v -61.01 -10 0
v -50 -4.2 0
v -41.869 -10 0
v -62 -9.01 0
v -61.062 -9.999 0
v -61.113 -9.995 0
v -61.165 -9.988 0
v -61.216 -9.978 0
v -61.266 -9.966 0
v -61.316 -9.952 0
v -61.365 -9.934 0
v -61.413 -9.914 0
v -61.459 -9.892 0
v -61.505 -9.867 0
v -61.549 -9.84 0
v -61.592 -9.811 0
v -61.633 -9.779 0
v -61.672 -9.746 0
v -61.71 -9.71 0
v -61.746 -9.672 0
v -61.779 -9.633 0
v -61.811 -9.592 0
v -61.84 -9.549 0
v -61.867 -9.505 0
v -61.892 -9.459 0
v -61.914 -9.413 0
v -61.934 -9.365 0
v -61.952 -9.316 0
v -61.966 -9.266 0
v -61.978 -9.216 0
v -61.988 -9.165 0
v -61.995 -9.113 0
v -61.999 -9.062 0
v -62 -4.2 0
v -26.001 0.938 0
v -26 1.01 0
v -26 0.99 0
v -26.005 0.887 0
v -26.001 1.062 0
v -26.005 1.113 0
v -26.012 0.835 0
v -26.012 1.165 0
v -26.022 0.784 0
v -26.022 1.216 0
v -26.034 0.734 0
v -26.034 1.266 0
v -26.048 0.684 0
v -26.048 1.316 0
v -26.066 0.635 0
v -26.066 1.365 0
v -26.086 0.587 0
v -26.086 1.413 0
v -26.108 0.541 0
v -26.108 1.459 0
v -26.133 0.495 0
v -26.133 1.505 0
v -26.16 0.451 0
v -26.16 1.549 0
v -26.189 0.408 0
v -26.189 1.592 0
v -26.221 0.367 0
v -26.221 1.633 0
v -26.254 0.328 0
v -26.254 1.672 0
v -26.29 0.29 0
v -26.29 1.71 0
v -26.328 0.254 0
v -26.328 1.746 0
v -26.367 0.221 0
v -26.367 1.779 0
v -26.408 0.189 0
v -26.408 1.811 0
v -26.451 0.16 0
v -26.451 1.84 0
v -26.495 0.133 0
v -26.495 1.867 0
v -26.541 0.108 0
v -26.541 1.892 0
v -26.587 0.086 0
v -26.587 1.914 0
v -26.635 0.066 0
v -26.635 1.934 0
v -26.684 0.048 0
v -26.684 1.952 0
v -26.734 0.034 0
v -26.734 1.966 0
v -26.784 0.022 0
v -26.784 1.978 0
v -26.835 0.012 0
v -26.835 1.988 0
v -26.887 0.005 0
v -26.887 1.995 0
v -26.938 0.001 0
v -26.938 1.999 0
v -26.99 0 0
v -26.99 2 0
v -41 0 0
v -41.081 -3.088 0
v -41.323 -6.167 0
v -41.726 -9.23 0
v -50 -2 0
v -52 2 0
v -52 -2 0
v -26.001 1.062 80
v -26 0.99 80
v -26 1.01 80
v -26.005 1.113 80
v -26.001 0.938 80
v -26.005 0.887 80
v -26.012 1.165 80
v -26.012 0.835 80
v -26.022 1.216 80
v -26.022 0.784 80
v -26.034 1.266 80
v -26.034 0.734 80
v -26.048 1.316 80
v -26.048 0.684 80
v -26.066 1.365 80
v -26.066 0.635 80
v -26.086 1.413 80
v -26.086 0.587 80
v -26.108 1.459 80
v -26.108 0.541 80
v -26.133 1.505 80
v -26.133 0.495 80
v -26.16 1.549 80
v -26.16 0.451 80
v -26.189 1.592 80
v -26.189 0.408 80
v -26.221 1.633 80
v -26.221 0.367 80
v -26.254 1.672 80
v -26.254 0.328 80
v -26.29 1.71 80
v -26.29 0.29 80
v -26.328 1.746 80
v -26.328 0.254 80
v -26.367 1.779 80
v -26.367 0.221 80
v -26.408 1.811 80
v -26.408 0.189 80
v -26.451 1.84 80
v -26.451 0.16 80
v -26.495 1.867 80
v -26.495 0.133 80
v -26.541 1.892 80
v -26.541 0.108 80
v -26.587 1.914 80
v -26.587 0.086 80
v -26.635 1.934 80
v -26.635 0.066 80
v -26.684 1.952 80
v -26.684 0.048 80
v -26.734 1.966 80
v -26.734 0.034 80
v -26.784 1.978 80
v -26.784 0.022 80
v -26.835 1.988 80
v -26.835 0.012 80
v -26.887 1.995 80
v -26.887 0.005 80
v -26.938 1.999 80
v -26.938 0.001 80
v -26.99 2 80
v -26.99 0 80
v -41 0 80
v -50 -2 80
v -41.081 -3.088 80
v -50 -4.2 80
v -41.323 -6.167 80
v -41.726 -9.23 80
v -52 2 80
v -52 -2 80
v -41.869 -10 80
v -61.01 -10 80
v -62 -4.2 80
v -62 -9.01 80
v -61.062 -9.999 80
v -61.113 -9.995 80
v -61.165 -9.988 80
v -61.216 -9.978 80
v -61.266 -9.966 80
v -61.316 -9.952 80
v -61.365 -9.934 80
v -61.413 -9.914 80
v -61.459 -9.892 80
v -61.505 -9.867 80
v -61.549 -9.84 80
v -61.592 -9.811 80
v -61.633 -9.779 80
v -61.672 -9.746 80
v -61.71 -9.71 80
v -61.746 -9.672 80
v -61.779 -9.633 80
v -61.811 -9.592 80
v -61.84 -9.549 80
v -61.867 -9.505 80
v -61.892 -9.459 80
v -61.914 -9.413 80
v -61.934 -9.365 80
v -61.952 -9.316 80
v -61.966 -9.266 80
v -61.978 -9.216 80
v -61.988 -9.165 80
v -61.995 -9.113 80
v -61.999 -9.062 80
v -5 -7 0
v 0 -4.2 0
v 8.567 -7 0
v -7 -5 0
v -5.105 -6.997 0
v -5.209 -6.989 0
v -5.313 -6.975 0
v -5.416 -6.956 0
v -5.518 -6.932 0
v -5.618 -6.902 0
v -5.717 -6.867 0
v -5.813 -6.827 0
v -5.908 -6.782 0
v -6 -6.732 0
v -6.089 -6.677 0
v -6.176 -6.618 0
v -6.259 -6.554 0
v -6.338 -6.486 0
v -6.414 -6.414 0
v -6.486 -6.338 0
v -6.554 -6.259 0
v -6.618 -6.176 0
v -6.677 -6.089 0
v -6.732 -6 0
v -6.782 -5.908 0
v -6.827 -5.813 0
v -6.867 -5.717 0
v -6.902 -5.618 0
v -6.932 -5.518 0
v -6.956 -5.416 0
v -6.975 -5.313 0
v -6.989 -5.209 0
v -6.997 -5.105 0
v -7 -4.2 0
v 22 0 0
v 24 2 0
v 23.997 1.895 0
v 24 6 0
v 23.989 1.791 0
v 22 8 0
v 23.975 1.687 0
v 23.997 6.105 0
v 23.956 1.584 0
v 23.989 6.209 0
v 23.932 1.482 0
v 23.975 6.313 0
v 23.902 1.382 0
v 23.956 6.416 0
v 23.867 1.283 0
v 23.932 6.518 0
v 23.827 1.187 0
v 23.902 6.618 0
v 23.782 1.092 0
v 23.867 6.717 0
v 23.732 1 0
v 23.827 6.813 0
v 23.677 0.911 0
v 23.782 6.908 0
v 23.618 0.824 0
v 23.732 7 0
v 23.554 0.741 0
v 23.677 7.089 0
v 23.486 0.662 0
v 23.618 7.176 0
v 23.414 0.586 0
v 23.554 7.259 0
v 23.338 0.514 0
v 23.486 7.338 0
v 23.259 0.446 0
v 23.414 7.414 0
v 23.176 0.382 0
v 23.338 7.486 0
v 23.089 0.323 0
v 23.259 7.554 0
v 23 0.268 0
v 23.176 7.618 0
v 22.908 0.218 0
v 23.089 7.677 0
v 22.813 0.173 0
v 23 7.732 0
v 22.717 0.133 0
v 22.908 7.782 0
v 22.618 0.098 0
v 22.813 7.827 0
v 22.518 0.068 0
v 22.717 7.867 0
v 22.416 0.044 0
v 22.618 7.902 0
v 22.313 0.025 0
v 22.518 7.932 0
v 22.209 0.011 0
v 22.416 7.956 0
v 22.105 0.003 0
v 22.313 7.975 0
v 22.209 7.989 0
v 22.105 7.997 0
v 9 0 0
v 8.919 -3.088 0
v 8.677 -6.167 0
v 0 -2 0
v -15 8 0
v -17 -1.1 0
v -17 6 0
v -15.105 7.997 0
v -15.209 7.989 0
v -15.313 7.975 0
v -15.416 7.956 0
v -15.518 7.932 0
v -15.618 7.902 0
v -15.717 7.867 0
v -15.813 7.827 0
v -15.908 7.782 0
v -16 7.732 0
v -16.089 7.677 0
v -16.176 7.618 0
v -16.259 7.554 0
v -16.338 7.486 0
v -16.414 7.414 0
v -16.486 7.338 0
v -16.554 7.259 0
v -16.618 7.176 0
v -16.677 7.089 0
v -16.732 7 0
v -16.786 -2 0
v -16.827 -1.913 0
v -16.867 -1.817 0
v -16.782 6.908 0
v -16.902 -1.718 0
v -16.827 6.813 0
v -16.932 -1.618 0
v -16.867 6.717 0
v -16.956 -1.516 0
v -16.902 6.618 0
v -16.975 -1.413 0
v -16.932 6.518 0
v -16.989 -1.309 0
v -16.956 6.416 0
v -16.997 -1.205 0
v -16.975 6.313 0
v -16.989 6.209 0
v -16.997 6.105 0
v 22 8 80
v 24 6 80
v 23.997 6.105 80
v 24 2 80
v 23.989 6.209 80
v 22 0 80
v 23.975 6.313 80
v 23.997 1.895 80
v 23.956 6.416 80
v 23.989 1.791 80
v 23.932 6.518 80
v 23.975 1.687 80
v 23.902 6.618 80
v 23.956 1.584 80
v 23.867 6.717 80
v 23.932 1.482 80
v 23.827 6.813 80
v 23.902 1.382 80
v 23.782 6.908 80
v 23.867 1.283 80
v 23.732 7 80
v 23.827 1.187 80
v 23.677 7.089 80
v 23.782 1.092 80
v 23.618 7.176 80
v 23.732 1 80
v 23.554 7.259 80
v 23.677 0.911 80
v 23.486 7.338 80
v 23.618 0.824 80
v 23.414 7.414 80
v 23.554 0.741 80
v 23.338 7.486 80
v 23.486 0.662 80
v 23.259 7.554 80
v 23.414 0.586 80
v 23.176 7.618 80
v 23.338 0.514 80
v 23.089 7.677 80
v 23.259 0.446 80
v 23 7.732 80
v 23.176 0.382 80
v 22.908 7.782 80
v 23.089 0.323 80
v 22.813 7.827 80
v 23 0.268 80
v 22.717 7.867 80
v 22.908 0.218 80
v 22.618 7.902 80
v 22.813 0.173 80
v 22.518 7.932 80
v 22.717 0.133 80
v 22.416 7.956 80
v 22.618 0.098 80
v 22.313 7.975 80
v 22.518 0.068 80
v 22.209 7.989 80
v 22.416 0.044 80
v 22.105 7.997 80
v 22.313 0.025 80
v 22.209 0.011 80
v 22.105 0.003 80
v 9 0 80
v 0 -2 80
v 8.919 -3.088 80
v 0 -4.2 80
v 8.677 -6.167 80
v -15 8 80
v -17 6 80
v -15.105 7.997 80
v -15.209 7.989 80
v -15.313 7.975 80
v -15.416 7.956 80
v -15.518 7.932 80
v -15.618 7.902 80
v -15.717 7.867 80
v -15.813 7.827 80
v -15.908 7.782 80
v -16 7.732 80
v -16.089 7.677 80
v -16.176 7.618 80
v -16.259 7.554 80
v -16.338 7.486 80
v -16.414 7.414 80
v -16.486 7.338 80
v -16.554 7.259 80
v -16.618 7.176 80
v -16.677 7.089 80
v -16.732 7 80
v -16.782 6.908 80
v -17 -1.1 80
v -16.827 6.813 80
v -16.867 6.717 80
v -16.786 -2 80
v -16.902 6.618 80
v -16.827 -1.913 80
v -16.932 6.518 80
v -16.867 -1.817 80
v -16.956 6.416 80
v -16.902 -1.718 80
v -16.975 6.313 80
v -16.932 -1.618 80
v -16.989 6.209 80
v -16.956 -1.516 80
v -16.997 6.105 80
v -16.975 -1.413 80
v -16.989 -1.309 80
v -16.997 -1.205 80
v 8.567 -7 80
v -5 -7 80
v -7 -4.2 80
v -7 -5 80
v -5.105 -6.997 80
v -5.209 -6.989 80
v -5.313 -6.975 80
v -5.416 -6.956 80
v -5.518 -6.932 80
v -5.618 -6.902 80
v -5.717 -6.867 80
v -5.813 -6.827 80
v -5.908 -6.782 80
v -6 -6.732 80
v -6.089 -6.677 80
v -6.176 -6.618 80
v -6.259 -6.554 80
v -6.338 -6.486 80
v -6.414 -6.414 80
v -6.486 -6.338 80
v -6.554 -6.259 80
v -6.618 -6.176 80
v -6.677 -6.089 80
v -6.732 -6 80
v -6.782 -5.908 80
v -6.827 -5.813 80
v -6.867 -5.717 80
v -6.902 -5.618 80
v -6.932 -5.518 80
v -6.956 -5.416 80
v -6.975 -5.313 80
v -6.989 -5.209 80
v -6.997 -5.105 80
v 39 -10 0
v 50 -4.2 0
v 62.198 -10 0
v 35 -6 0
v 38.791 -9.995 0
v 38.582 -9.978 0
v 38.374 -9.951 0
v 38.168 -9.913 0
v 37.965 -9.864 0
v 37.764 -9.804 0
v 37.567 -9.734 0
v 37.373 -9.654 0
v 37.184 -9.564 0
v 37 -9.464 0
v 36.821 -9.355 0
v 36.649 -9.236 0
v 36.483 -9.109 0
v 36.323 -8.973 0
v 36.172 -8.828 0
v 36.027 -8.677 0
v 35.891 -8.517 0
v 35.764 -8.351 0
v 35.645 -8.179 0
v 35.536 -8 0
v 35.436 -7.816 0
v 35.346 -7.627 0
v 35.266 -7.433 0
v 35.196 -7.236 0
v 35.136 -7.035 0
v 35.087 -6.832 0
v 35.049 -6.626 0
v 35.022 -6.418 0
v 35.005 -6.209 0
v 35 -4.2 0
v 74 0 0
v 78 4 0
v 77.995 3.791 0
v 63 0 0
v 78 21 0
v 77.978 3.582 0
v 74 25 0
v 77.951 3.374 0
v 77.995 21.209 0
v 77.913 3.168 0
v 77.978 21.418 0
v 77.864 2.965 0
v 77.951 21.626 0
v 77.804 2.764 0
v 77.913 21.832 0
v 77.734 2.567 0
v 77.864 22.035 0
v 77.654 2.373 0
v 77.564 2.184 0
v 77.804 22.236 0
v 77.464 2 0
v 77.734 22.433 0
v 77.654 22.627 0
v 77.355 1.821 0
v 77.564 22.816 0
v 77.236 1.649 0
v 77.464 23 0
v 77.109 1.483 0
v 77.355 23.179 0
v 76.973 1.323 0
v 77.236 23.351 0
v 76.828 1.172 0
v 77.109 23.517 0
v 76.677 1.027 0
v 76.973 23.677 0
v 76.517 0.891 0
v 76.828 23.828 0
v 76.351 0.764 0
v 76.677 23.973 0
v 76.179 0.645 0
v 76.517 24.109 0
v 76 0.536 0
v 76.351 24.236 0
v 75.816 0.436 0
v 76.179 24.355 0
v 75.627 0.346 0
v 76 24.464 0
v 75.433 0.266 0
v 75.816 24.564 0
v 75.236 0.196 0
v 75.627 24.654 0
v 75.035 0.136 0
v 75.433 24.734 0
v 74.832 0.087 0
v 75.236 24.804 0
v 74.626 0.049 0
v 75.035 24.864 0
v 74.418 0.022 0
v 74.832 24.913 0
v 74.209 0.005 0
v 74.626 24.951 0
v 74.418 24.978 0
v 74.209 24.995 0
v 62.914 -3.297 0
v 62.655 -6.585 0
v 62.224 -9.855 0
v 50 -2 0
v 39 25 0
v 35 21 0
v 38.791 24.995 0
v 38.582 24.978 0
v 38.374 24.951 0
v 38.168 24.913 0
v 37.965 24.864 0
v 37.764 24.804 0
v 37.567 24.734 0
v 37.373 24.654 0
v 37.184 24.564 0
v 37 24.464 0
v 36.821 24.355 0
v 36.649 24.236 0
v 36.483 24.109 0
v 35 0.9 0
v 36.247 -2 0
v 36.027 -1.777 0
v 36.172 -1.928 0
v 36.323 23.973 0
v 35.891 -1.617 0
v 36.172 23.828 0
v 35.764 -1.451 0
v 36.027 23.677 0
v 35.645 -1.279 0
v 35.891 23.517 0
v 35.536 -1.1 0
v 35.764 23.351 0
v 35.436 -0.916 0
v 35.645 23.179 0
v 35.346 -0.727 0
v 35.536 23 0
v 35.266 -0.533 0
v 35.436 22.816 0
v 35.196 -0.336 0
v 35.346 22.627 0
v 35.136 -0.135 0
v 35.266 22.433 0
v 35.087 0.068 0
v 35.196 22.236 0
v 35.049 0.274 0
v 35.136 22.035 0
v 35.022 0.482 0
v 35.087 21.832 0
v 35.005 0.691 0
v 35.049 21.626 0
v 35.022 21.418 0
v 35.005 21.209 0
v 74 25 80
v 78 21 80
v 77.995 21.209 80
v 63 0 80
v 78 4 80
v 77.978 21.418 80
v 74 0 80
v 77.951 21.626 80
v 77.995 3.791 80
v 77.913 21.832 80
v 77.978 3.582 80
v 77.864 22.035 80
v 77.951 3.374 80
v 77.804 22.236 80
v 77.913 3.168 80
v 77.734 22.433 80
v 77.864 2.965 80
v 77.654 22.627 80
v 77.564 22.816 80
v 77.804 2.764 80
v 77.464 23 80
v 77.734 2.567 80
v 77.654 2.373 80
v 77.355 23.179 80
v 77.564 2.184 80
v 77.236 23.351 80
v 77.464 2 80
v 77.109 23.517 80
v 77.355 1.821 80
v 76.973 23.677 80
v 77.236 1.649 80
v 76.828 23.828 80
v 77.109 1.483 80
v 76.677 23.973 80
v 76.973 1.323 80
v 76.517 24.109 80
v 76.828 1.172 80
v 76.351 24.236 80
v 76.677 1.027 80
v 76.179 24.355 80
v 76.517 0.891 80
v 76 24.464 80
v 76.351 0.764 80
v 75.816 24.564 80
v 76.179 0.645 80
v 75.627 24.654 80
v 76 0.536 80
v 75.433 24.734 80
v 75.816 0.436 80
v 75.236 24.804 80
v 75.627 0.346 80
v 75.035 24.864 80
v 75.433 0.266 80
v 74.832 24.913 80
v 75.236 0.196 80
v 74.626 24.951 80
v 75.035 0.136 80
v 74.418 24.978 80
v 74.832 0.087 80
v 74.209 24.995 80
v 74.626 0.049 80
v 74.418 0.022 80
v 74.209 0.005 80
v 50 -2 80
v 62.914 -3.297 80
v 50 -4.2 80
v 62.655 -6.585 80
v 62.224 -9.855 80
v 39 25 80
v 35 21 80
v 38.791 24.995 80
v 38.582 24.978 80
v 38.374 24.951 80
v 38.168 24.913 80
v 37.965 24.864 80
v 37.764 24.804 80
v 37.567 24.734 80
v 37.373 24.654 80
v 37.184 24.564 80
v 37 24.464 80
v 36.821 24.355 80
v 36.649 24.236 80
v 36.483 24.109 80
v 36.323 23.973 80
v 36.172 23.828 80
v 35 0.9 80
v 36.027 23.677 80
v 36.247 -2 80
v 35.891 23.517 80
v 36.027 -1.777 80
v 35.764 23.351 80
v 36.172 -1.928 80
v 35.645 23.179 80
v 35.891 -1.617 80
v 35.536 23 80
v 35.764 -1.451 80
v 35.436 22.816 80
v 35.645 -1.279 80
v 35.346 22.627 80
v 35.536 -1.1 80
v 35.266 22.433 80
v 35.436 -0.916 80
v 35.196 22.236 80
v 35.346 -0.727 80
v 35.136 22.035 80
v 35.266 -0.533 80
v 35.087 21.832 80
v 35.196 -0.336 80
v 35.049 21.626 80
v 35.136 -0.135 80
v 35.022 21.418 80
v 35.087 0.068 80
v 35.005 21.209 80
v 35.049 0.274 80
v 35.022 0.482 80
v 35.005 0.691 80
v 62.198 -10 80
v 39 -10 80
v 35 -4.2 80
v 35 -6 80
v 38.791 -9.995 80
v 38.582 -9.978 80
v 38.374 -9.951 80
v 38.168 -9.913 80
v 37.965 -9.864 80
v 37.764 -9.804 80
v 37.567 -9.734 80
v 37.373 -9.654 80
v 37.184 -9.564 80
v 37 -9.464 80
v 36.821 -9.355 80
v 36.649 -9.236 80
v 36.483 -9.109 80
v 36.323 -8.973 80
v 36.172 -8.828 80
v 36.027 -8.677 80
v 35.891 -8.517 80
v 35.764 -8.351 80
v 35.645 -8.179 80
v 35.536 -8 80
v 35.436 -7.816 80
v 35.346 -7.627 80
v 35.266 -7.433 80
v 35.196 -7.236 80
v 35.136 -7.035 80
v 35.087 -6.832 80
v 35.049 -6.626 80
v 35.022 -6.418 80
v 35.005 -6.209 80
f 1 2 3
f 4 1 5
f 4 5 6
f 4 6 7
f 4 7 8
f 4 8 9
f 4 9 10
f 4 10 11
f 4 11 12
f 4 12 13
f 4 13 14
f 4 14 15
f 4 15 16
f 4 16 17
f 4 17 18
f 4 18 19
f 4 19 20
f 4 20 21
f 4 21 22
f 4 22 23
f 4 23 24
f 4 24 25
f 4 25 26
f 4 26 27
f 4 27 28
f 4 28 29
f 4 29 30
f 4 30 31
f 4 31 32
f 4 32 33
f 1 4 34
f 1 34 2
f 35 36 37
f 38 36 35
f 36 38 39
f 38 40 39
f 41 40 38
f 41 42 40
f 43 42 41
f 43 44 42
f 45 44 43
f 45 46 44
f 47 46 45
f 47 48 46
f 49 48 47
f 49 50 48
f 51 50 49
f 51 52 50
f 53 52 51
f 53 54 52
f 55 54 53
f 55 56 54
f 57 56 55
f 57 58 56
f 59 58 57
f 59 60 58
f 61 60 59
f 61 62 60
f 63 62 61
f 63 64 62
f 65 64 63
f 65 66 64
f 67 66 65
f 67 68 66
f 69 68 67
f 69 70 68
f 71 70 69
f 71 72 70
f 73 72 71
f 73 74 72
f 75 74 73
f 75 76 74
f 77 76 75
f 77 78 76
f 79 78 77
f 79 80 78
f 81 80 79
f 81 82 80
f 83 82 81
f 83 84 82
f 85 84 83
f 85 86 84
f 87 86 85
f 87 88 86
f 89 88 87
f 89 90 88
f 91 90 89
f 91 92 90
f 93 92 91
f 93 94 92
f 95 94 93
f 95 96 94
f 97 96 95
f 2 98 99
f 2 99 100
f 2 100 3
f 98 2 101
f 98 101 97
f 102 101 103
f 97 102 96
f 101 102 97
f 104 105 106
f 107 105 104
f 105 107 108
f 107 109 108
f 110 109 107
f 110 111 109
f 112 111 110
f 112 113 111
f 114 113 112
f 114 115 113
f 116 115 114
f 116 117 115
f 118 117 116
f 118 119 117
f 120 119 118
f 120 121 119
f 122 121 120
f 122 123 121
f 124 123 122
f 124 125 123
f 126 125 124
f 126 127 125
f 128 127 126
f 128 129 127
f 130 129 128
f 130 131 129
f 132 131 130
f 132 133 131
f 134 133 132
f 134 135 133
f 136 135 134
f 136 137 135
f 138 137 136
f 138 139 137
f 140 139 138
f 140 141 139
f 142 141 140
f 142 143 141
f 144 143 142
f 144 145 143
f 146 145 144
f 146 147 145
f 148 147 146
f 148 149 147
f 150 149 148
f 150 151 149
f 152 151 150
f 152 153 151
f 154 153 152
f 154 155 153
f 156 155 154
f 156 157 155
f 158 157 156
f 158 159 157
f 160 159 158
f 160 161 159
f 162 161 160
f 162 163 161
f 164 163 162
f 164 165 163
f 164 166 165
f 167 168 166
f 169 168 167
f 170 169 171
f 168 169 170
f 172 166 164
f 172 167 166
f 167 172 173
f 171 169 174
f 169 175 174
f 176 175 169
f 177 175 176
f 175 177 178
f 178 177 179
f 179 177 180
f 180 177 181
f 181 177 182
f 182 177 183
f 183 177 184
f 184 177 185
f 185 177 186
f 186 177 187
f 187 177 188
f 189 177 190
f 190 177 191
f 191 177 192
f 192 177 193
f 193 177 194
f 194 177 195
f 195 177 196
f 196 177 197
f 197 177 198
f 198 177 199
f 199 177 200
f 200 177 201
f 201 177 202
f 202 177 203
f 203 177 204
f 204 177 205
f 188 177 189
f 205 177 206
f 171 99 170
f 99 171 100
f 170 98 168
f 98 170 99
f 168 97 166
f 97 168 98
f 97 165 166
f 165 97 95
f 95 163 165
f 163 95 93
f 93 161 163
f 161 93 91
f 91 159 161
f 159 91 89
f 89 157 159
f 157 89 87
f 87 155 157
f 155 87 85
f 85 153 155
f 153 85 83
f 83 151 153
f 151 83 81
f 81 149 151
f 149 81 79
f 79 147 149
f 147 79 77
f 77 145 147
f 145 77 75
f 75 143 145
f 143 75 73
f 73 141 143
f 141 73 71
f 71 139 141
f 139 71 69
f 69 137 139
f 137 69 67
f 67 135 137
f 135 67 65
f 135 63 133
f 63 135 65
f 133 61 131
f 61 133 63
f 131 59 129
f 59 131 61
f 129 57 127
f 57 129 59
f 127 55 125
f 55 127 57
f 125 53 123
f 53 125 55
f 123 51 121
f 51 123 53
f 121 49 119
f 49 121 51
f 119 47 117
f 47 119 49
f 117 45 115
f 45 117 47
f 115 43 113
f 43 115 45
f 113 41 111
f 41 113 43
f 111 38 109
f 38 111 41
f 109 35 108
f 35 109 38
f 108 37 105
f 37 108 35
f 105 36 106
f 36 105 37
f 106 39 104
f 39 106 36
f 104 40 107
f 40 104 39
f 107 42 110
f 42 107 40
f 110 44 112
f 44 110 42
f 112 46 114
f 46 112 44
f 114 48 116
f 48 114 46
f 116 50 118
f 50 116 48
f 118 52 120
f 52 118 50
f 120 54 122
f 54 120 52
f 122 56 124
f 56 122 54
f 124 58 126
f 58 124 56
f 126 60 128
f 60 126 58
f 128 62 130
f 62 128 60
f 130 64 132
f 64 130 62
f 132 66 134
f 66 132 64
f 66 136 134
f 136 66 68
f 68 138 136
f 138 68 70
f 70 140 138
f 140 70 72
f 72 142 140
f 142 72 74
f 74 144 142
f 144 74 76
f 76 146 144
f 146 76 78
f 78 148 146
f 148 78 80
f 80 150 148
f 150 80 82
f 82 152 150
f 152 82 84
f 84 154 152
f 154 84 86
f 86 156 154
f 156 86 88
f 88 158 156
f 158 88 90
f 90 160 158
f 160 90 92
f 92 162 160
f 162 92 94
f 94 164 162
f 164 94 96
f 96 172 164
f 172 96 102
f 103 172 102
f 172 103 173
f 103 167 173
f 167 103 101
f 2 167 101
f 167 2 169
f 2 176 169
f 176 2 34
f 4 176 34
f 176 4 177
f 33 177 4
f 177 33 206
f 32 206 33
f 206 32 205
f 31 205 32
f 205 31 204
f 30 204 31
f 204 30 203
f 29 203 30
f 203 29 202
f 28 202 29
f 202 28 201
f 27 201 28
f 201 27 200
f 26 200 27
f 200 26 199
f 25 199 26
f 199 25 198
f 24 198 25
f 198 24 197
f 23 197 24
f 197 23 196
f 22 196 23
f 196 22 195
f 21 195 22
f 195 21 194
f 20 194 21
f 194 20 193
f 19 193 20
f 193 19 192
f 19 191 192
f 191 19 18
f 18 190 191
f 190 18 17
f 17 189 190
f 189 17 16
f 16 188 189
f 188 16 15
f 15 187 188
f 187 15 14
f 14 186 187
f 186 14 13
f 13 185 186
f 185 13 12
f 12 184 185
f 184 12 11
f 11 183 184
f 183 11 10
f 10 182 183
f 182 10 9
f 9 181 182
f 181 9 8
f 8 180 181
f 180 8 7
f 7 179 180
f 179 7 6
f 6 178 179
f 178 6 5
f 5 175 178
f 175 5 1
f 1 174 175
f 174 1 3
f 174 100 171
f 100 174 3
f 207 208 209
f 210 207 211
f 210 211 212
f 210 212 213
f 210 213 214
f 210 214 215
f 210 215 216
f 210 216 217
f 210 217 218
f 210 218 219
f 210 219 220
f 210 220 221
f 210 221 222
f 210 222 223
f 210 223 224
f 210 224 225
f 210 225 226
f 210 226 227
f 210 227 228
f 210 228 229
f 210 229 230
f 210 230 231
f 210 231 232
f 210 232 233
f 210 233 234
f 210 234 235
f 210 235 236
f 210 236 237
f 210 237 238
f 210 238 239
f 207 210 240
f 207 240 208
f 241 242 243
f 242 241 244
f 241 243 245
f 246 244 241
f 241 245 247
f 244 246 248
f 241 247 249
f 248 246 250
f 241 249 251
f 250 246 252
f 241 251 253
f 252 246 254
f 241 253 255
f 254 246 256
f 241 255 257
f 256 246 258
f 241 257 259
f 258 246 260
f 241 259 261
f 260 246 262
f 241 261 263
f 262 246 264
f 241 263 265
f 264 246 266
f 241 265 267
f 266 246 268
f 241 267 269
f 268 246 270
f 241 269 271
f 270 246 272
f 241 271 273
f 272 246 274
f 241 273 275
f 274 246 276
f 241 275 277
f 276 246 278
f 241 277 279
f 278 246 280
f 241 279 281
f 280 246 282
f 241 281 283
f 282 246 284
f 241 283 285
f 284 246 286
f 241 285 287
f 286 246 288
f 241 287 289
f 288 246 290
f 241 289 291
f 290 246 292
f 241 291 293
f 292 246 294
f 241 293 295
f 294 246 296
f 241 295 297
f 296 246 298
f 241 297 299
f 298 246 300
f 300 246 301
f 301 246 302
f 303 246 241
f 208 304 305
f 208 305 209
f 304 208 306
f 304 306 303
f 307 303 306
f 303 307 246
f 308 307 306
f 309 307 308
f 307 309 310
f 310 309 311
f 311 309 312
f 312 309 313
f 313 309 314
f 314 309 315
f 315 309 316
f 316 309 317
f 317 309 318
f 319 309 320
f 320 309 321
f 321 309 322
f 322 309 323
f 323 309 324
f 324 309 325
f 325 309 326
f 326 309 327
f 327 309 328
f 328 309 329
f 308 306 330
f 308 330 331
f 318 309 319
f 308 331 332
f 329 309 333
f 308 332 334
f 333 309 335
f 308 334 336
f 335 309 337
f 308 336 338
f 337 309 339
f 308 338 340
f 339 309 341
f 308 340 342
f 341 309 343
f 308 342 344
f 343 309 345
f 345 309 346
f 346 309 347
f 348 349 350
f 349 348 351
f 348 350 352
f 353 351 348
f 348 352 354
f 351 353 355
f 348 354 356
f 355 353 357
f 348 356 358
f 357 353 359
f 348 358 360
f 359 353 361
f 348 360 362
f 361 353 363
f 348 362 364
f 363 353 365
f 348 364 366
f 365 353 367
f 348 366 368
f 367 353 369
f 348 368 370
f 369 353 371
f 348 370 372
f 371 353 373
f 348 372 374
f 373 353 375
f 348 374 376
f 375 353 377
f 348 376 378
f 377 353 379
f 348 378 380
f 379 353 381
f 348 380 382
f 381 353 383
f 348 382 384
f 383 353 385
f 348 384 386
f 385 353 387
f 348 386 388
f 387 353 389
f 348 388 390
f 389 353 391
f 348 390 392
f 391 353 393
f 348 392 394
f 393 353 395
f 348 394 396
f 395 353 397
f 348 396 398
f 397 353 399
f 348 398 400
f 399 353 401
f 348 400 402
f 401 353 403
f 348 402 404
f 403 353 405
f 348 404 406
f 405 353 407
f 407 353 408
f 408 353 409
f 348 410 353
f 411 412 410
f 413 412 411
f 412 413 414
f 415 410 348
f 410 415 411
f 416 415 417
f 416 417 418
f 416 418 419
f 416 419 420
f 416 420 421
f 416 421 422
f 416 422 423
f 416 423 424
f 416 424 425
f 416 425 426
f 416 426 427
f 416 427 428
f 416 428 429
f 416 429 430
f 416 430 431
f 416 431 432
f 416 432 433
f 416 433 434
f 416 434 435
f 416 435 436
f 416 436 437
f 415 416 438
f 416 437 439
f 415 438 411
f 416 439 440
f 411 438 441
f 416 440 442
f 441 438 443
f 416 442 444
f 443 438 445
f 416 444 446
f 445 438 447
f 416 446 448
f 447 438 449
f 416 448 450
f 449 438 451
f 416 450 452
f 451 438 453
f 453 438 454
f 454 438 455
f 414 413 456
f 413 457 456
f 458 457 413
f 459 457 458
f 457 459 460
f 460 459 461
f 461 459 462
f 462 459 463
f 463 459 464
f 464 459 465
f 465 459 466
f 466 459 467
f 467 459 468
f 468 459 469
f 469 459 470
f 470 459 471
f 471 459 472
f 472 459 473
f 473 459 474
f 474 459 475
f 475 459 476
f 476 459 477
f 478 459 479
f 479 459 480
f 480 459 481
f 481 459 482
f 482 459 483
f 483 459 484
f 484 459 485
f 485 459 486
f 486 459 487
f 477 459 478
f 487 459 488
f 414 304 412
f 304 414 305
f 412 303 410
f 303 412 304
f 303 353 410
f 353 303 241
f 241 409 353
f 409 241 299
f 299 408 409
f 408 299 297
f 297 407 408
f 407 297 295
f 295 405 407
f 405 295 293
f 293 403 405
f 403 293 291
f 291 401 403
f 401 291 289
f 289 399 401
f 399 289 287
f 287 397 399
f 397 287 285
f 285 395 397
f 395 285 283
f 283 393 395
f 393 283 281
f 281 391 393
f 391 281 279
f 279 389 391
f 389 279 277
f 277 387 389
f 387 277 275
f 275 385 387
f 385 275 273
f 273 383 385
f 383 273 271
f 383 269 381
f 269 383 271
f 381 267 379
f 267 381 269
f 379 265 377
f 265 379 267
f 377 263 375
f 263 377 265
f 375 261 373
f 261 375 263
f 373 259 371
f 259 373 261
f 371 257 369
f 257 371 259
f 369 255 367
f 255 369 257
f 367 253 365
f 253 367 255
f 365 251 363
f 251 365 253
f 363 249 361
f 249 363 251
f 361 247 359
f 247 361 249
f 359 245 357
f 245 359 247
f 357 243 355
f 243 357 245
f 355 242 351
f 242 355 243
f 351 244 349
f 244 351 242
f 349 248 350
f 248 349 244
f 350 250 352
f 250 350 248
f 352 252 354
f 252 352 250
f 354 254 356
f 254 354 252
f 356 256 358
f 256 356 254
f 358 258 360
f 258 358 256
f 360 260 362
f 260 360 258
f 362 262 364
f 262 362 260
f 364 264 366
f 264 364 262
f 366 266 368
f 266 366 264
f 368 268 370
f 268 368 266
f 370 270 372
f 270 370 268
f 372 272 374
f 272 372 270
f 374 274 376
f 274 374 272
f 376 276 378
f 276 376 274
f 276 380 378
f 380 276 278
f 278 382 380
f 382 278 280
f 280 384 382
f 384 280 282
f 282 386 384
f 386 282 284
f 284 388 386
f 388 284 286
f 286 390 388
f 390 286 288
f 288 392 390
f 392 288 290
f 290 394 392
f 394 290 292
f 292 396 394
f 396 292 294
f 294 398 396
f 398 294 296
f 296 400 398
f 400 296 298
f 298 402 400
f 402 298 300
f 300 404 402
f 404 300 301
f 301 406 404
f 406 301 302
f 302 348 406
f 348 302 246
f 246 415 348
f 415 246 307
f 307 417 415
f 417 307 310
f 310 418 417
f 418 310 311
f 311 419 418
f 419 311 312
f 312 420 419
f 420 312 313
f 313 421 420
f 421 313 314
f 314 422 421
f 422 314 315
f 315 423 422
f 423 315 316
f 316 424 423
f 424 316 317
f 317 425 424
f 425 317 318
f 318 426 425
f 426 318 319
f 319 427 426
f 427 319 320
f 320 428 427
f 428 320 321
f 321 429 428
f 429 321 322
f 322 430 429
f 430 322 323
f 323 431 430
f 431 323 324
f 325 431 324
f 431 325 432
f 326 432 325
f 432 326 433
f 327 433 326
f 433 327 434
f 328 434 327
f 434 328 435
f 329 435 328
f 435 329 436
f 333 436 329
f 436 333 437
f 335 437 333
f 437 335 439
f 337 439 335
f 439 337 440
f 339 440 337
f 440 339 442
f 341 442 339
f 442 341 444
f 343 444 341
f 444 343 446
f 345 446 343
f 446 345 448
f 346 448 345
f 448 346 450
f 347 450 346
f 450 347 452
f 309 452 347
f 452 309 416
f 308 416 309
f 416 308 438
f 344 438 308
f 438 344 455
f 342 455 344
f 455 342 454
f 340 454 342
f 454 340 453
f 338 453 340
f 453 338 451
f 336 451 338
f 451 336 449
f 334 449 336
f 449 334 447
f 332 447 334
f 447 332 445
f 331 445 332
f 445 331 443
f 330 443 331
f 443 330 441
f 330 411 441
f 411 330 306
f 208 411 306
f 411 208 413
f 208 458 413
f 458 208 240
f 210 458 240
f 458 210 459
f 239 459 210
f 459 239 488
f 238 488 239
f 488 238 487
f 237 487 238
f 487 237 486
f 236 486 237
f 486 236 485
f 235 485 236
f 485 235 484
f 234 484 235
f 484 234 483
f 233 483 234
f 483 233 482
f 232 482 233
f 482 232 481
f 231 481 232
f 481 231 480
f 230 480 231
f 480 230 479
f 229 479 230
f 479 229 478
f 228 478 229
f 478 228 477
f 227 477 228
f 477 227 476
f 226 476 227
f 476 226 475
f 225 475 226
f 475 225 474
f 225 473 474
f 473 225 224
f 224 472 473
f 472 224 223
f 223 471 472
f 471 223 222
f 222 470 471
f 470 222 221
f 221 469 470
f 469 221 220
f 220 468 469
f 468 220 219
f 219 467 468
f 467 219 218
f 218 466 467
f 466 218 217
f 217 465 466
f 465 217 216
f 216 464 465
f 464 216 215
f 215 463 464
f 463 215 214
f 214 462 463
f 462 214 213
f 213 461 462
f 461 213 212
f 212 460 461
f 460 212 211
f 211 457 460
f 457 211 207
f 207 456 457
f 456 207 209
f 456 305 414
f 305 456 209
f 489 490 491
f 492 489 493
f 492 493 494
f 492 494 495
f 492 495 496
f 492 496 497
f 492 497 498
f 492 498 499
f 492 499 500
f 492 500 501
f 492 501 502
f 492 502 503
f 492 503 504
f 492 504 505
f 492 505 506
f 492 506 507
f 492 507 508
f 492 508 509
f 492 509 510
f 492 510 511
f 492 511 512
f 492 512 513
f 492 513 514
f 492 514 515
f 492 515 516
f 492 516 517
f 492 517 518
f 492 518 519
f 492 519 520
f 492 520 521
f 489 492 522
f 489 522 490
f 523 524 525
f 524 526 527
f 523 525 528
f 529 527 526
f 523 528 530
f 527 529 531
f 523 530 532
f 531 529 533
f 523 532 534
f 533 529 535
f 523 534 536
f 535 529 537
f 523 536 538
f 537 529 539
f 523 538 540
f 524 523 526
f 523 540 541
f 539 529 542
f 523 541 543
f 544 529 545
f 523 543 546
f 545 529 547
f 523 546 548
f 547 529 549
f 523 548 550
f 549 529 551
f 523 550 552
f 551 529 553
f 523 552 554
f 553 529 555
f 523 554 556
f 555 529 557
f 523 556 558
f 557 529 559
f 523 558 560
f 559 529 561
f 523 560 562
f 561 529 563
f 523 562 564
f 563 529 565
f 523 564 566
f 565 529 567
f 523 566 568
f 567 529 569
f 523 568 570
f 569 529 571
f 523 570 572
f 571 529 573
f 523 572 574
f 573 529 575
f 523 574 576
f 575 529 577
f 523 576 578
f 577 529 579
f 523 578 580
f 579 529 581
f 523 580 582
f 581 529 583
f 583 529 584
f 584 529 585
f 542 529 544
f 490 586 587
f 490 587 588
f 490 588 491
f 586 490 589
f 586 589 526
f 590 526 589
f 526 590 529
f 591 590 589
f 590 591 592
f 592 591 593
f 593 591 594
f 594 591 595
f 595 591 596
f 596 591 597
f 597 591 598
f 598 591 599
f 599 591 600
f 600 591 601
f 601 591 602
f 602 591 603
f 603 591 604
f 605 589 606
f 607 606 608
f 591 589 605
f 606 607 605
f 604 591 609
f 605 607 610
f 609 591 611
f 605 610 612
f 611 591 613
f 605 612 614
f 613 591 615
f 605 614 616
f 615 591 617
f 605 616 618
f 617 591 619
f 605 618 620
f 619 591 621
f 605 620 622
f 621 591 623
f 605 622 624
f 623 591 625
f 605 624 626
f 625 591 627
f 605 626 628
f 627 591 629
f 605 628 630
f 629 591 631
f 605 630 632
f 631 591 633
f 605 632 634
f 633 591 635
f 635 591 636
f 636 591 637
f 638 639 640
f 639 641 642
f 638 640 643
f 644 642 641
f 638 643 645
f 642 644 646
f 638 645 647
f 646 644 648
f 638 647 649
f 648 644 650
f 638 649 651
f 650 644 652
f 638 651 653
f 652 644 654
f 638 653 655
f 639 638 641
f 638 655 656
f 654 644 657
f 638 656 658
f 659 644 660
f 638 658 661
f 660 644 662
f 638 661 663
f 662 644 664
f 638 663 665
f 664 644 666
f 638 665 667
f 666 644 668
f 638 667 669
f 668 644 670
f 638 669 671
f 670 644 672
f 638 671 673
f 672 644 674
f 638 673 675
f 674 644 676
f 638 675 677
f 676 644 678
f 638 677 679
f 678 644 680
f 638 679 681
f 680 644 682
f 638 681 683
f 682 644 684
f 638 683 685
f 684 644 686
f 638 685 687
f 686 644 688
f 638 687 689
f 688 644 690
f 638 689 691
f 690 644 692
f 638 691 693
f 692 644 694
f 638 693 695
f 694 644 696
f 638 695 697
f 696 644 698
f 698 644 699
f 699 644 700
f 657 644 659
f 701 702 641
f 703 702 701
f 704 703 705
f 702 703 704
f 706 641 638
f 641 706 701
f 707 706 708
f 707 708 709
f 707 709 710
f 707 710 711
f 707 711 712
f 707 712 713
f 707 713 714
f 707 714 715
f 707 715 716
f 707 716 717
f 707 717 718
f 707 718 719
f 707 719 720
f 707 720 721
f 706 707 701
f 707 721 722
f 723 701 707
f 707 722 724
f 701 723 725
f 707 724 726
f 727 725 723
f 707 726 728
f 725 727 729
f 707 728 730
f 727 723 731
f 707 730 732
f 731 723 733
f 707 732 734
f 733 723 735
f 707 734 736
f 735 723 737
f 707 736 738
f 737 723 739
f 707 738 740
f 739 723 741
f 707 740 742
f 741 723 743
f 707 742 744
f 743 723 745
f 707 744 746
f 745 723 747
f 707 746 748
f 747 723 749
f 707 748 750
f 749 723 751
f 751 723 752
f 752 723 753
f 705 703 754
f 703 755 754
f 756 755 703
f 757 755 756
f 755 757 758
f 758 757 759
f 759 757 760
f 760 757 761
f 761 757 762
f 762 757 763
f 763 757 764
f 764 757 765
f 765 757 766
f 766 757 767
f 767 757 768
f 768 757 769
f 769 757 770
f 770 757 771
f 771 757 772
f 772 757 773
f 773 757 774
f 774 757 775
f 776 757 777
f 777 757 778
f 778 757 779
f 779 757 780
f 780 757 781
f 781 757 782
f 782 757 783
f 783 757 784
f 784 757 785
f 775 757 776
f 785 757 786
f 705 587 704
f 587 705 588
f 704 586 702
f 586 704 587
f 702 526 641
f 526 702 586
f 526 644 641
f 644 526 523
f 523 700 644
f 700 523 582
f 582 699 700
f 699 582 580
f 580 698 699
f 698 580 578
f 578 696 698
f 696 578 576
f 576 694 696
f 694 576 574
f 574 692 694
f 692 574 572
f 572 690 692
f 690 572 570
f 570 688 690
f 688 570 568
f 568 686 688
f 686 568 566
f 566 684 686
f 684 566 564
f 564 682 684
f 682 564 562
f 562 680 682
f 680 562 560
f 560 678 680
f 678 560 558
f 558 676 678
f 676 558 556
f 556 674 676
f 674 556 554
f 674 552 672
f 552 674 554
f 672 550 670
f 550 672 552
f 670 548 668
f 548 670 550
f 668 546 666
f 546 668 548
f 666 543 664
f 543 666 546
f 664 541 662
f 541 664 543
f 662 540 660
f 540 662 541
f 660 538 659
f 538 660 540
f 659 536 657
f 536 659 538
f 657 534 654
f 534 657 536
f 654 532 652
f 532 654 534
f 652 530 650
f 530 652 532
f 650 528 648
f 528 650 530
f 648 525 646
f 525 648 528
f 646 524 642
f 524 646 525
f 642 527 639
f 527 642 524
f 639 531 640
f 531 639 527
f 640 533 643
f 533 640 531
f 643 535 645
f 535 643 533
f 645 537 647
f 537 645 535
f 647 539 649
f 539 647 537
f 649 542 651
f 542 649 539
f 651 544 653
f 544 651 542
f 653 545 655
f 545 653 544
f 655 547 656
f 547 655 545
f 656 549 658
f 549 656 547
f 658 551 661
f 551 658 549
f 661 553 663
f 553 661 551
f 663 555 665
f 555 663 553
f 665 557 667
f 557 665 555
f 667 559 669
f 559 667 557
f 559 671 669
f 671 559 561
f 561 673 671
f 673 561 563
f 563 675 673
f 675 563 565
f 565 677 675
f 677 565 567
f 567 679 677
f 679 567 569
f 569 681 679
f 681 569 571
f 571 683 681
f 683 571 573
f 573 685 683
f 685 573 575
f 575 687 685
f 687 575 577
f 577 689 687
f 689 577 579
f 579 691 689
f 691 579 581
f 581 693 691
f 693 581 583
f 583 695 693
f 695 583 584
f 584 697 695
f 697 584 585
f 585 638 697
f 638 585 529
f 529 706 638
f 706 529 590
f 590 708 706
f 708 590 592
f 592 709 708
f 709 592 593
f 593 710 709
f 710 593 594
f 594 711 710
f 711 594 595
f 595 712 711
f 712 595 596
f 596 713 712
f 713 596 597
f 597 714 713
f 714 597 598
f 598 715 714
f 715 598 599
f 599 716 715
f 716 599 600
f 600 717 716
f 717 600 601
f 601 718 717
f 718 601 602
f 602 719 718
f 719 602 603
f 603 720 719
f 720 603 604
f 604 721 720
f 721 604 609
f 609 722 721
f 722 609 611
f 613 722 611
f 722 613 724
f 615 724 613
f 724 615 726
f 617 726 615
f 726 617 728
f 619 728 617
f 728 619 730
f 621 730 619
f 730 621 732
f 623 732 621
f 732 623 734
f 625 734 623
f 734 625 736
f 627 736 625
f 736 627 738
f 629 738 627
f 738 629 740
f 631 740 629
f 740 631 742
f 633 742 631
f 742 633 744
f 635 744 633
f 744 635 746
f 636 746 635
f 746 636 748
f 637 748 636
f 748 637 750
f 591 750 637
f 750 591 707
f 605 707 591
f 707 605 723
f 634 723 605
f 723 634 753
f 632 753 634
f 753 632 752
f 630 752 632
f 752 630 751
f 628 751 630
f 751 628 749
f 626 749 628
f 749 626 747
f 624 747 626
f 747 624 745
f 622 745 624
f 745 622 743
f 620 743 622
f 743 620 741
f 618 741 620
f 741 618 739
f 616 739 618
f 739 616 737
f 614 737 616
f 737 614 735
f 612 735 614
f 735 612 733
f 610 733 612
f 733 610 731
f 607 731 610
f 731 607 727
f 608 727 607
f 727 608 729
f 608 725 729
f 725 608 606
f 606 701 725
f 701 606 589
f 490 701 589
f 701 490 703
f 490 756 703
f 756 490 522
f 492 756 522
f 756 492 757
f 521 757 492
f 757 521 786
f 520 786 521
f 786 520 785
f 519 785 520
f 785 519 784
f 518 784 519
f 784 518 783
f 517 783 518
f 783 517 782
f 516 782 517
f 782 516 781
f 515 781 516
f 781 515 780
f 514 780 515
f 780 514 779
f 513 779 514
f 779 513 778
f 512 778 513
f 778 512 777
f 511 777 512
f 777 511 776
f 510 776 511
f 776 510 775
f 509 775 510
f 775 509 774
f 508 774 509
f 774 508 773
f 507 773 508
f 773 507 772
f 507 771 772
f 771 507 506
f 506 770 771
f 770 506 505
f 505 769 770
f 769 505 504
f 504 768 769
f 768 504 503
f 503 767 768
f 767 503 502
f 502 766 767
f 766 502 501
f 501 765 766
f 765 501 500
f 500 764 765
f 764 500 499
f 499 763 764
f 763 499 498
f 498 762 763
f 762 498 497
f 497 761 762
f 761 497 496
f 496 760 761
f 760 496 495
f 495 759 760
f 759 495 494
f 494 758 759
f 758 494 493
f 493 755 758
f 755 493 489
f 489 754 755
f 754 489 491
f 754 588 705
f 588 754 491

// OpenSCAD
module anchor(
    width=80,
    height_above_surface=20, 
    rotate_radius=9,
    front_extension_depth=15,
    back_extension_depth=17,
    back_extension_under=12,
    back_plate_sink=2,
    back_plate_height=2.2,
    back_plate_depth=50,
    back_height_under=10,
    r=3) {
  linear_extrude(height=width) 
  difference() {
    union() {
      // 1/4 pie
      r = min(height_above_surface / 2 - 0.01, r);
*      difference() {
        circle(r=rotate_radius);
        translate([-1.5 * rotate_radius, 0.1 * rotate_radius]) 
          square(3 * rotate_radius, 1.5 * rotate_radius);
        translate([-1.6 * rotate_radius, -1.1 * rotate_radius]) 
          square(1.5 * rotate_radius, 1.5 * rotate_radius);
      }
     intersection() {
        translate([-back_plate_depth, 0])
          circle(back_plate_depth + rotate_radius);
        translate([-2, 2]) mirror([0, 1, 0])
        square([rotate_radius + 2, back_height_under + 2]);
      }
      // top
      translate([r - back_extension_depth, r])
      offset(r=r) {
        square([
            back_extension_depth + rotate_radius + front_extension_depth - 2 * r, 
            height_above_surface - 2 * r
          ]);
      }

      // back surface, domanated by back_extension_depth
      translate([r - back_extension_depth, r - (back_plate_sink + back_plate_height / 2)])
        difference() {
          offset(r=r) {
            square([back_extension_depth * 1.25 - 0 * r, back_plate_sink + back_plate_height / 2 + r]);
          }
          translate([- 2 * r - 0.125 * back_extension_depth, back_plate_sink + back_plate_height / 2 - r + height_above_surface / 2]) 
            square([back_extension_depth * 1.5 + 4 * r, 2 * r + rotate_radius]);
          translate([-r + back_extension_depth, -r * 1.5]) 
            square([back_extension_depth + 2 * r, rotate_radius + 4 * r]);
        }
      // back bottom,  domanated by back_extension_under
      translate([r - back_extension_under, r - back_height_under])
        difference() {
          offset(r=r) {
            square([back_extension_under * 1.25 - 0 * r, back_height_under + r]);
          }
          translate([- 2 * r - 0.125 * back_extension_under, back_height_under - r - back_plate_sink - back_plate_height / 2]) 
            square([back_extension_under * 1.5 + 4 * r, 2 * r + back_height_under]);
          translate([-r + back_extension_under, -r * 1.5]) 
            square([back_extension_under + 2 * r, back_height_under + 4 * r]);
        }
    }
    // plate insert
    translate([0, -back_plate_sink - back_plate_height])
      mirror([1, 0, 0])
    square([max(back_extension_depth, back_extension_under) + 10, back_plate_height]);
  }
}

translate([-50, 0, 0]) anchor(height_above_surface=2, r=1, back_extension_depth=2, $fn=120);
anchor(height_above_surface=8, r=2, back_extension_under=7, back_height_under= 7, $fn=120);
translate([50, 0, 0]) anchor(height_above_surface=25, r=4, rotate_radius=13, back_extension_under=15, back_extension_depth=15, $fn=120);
